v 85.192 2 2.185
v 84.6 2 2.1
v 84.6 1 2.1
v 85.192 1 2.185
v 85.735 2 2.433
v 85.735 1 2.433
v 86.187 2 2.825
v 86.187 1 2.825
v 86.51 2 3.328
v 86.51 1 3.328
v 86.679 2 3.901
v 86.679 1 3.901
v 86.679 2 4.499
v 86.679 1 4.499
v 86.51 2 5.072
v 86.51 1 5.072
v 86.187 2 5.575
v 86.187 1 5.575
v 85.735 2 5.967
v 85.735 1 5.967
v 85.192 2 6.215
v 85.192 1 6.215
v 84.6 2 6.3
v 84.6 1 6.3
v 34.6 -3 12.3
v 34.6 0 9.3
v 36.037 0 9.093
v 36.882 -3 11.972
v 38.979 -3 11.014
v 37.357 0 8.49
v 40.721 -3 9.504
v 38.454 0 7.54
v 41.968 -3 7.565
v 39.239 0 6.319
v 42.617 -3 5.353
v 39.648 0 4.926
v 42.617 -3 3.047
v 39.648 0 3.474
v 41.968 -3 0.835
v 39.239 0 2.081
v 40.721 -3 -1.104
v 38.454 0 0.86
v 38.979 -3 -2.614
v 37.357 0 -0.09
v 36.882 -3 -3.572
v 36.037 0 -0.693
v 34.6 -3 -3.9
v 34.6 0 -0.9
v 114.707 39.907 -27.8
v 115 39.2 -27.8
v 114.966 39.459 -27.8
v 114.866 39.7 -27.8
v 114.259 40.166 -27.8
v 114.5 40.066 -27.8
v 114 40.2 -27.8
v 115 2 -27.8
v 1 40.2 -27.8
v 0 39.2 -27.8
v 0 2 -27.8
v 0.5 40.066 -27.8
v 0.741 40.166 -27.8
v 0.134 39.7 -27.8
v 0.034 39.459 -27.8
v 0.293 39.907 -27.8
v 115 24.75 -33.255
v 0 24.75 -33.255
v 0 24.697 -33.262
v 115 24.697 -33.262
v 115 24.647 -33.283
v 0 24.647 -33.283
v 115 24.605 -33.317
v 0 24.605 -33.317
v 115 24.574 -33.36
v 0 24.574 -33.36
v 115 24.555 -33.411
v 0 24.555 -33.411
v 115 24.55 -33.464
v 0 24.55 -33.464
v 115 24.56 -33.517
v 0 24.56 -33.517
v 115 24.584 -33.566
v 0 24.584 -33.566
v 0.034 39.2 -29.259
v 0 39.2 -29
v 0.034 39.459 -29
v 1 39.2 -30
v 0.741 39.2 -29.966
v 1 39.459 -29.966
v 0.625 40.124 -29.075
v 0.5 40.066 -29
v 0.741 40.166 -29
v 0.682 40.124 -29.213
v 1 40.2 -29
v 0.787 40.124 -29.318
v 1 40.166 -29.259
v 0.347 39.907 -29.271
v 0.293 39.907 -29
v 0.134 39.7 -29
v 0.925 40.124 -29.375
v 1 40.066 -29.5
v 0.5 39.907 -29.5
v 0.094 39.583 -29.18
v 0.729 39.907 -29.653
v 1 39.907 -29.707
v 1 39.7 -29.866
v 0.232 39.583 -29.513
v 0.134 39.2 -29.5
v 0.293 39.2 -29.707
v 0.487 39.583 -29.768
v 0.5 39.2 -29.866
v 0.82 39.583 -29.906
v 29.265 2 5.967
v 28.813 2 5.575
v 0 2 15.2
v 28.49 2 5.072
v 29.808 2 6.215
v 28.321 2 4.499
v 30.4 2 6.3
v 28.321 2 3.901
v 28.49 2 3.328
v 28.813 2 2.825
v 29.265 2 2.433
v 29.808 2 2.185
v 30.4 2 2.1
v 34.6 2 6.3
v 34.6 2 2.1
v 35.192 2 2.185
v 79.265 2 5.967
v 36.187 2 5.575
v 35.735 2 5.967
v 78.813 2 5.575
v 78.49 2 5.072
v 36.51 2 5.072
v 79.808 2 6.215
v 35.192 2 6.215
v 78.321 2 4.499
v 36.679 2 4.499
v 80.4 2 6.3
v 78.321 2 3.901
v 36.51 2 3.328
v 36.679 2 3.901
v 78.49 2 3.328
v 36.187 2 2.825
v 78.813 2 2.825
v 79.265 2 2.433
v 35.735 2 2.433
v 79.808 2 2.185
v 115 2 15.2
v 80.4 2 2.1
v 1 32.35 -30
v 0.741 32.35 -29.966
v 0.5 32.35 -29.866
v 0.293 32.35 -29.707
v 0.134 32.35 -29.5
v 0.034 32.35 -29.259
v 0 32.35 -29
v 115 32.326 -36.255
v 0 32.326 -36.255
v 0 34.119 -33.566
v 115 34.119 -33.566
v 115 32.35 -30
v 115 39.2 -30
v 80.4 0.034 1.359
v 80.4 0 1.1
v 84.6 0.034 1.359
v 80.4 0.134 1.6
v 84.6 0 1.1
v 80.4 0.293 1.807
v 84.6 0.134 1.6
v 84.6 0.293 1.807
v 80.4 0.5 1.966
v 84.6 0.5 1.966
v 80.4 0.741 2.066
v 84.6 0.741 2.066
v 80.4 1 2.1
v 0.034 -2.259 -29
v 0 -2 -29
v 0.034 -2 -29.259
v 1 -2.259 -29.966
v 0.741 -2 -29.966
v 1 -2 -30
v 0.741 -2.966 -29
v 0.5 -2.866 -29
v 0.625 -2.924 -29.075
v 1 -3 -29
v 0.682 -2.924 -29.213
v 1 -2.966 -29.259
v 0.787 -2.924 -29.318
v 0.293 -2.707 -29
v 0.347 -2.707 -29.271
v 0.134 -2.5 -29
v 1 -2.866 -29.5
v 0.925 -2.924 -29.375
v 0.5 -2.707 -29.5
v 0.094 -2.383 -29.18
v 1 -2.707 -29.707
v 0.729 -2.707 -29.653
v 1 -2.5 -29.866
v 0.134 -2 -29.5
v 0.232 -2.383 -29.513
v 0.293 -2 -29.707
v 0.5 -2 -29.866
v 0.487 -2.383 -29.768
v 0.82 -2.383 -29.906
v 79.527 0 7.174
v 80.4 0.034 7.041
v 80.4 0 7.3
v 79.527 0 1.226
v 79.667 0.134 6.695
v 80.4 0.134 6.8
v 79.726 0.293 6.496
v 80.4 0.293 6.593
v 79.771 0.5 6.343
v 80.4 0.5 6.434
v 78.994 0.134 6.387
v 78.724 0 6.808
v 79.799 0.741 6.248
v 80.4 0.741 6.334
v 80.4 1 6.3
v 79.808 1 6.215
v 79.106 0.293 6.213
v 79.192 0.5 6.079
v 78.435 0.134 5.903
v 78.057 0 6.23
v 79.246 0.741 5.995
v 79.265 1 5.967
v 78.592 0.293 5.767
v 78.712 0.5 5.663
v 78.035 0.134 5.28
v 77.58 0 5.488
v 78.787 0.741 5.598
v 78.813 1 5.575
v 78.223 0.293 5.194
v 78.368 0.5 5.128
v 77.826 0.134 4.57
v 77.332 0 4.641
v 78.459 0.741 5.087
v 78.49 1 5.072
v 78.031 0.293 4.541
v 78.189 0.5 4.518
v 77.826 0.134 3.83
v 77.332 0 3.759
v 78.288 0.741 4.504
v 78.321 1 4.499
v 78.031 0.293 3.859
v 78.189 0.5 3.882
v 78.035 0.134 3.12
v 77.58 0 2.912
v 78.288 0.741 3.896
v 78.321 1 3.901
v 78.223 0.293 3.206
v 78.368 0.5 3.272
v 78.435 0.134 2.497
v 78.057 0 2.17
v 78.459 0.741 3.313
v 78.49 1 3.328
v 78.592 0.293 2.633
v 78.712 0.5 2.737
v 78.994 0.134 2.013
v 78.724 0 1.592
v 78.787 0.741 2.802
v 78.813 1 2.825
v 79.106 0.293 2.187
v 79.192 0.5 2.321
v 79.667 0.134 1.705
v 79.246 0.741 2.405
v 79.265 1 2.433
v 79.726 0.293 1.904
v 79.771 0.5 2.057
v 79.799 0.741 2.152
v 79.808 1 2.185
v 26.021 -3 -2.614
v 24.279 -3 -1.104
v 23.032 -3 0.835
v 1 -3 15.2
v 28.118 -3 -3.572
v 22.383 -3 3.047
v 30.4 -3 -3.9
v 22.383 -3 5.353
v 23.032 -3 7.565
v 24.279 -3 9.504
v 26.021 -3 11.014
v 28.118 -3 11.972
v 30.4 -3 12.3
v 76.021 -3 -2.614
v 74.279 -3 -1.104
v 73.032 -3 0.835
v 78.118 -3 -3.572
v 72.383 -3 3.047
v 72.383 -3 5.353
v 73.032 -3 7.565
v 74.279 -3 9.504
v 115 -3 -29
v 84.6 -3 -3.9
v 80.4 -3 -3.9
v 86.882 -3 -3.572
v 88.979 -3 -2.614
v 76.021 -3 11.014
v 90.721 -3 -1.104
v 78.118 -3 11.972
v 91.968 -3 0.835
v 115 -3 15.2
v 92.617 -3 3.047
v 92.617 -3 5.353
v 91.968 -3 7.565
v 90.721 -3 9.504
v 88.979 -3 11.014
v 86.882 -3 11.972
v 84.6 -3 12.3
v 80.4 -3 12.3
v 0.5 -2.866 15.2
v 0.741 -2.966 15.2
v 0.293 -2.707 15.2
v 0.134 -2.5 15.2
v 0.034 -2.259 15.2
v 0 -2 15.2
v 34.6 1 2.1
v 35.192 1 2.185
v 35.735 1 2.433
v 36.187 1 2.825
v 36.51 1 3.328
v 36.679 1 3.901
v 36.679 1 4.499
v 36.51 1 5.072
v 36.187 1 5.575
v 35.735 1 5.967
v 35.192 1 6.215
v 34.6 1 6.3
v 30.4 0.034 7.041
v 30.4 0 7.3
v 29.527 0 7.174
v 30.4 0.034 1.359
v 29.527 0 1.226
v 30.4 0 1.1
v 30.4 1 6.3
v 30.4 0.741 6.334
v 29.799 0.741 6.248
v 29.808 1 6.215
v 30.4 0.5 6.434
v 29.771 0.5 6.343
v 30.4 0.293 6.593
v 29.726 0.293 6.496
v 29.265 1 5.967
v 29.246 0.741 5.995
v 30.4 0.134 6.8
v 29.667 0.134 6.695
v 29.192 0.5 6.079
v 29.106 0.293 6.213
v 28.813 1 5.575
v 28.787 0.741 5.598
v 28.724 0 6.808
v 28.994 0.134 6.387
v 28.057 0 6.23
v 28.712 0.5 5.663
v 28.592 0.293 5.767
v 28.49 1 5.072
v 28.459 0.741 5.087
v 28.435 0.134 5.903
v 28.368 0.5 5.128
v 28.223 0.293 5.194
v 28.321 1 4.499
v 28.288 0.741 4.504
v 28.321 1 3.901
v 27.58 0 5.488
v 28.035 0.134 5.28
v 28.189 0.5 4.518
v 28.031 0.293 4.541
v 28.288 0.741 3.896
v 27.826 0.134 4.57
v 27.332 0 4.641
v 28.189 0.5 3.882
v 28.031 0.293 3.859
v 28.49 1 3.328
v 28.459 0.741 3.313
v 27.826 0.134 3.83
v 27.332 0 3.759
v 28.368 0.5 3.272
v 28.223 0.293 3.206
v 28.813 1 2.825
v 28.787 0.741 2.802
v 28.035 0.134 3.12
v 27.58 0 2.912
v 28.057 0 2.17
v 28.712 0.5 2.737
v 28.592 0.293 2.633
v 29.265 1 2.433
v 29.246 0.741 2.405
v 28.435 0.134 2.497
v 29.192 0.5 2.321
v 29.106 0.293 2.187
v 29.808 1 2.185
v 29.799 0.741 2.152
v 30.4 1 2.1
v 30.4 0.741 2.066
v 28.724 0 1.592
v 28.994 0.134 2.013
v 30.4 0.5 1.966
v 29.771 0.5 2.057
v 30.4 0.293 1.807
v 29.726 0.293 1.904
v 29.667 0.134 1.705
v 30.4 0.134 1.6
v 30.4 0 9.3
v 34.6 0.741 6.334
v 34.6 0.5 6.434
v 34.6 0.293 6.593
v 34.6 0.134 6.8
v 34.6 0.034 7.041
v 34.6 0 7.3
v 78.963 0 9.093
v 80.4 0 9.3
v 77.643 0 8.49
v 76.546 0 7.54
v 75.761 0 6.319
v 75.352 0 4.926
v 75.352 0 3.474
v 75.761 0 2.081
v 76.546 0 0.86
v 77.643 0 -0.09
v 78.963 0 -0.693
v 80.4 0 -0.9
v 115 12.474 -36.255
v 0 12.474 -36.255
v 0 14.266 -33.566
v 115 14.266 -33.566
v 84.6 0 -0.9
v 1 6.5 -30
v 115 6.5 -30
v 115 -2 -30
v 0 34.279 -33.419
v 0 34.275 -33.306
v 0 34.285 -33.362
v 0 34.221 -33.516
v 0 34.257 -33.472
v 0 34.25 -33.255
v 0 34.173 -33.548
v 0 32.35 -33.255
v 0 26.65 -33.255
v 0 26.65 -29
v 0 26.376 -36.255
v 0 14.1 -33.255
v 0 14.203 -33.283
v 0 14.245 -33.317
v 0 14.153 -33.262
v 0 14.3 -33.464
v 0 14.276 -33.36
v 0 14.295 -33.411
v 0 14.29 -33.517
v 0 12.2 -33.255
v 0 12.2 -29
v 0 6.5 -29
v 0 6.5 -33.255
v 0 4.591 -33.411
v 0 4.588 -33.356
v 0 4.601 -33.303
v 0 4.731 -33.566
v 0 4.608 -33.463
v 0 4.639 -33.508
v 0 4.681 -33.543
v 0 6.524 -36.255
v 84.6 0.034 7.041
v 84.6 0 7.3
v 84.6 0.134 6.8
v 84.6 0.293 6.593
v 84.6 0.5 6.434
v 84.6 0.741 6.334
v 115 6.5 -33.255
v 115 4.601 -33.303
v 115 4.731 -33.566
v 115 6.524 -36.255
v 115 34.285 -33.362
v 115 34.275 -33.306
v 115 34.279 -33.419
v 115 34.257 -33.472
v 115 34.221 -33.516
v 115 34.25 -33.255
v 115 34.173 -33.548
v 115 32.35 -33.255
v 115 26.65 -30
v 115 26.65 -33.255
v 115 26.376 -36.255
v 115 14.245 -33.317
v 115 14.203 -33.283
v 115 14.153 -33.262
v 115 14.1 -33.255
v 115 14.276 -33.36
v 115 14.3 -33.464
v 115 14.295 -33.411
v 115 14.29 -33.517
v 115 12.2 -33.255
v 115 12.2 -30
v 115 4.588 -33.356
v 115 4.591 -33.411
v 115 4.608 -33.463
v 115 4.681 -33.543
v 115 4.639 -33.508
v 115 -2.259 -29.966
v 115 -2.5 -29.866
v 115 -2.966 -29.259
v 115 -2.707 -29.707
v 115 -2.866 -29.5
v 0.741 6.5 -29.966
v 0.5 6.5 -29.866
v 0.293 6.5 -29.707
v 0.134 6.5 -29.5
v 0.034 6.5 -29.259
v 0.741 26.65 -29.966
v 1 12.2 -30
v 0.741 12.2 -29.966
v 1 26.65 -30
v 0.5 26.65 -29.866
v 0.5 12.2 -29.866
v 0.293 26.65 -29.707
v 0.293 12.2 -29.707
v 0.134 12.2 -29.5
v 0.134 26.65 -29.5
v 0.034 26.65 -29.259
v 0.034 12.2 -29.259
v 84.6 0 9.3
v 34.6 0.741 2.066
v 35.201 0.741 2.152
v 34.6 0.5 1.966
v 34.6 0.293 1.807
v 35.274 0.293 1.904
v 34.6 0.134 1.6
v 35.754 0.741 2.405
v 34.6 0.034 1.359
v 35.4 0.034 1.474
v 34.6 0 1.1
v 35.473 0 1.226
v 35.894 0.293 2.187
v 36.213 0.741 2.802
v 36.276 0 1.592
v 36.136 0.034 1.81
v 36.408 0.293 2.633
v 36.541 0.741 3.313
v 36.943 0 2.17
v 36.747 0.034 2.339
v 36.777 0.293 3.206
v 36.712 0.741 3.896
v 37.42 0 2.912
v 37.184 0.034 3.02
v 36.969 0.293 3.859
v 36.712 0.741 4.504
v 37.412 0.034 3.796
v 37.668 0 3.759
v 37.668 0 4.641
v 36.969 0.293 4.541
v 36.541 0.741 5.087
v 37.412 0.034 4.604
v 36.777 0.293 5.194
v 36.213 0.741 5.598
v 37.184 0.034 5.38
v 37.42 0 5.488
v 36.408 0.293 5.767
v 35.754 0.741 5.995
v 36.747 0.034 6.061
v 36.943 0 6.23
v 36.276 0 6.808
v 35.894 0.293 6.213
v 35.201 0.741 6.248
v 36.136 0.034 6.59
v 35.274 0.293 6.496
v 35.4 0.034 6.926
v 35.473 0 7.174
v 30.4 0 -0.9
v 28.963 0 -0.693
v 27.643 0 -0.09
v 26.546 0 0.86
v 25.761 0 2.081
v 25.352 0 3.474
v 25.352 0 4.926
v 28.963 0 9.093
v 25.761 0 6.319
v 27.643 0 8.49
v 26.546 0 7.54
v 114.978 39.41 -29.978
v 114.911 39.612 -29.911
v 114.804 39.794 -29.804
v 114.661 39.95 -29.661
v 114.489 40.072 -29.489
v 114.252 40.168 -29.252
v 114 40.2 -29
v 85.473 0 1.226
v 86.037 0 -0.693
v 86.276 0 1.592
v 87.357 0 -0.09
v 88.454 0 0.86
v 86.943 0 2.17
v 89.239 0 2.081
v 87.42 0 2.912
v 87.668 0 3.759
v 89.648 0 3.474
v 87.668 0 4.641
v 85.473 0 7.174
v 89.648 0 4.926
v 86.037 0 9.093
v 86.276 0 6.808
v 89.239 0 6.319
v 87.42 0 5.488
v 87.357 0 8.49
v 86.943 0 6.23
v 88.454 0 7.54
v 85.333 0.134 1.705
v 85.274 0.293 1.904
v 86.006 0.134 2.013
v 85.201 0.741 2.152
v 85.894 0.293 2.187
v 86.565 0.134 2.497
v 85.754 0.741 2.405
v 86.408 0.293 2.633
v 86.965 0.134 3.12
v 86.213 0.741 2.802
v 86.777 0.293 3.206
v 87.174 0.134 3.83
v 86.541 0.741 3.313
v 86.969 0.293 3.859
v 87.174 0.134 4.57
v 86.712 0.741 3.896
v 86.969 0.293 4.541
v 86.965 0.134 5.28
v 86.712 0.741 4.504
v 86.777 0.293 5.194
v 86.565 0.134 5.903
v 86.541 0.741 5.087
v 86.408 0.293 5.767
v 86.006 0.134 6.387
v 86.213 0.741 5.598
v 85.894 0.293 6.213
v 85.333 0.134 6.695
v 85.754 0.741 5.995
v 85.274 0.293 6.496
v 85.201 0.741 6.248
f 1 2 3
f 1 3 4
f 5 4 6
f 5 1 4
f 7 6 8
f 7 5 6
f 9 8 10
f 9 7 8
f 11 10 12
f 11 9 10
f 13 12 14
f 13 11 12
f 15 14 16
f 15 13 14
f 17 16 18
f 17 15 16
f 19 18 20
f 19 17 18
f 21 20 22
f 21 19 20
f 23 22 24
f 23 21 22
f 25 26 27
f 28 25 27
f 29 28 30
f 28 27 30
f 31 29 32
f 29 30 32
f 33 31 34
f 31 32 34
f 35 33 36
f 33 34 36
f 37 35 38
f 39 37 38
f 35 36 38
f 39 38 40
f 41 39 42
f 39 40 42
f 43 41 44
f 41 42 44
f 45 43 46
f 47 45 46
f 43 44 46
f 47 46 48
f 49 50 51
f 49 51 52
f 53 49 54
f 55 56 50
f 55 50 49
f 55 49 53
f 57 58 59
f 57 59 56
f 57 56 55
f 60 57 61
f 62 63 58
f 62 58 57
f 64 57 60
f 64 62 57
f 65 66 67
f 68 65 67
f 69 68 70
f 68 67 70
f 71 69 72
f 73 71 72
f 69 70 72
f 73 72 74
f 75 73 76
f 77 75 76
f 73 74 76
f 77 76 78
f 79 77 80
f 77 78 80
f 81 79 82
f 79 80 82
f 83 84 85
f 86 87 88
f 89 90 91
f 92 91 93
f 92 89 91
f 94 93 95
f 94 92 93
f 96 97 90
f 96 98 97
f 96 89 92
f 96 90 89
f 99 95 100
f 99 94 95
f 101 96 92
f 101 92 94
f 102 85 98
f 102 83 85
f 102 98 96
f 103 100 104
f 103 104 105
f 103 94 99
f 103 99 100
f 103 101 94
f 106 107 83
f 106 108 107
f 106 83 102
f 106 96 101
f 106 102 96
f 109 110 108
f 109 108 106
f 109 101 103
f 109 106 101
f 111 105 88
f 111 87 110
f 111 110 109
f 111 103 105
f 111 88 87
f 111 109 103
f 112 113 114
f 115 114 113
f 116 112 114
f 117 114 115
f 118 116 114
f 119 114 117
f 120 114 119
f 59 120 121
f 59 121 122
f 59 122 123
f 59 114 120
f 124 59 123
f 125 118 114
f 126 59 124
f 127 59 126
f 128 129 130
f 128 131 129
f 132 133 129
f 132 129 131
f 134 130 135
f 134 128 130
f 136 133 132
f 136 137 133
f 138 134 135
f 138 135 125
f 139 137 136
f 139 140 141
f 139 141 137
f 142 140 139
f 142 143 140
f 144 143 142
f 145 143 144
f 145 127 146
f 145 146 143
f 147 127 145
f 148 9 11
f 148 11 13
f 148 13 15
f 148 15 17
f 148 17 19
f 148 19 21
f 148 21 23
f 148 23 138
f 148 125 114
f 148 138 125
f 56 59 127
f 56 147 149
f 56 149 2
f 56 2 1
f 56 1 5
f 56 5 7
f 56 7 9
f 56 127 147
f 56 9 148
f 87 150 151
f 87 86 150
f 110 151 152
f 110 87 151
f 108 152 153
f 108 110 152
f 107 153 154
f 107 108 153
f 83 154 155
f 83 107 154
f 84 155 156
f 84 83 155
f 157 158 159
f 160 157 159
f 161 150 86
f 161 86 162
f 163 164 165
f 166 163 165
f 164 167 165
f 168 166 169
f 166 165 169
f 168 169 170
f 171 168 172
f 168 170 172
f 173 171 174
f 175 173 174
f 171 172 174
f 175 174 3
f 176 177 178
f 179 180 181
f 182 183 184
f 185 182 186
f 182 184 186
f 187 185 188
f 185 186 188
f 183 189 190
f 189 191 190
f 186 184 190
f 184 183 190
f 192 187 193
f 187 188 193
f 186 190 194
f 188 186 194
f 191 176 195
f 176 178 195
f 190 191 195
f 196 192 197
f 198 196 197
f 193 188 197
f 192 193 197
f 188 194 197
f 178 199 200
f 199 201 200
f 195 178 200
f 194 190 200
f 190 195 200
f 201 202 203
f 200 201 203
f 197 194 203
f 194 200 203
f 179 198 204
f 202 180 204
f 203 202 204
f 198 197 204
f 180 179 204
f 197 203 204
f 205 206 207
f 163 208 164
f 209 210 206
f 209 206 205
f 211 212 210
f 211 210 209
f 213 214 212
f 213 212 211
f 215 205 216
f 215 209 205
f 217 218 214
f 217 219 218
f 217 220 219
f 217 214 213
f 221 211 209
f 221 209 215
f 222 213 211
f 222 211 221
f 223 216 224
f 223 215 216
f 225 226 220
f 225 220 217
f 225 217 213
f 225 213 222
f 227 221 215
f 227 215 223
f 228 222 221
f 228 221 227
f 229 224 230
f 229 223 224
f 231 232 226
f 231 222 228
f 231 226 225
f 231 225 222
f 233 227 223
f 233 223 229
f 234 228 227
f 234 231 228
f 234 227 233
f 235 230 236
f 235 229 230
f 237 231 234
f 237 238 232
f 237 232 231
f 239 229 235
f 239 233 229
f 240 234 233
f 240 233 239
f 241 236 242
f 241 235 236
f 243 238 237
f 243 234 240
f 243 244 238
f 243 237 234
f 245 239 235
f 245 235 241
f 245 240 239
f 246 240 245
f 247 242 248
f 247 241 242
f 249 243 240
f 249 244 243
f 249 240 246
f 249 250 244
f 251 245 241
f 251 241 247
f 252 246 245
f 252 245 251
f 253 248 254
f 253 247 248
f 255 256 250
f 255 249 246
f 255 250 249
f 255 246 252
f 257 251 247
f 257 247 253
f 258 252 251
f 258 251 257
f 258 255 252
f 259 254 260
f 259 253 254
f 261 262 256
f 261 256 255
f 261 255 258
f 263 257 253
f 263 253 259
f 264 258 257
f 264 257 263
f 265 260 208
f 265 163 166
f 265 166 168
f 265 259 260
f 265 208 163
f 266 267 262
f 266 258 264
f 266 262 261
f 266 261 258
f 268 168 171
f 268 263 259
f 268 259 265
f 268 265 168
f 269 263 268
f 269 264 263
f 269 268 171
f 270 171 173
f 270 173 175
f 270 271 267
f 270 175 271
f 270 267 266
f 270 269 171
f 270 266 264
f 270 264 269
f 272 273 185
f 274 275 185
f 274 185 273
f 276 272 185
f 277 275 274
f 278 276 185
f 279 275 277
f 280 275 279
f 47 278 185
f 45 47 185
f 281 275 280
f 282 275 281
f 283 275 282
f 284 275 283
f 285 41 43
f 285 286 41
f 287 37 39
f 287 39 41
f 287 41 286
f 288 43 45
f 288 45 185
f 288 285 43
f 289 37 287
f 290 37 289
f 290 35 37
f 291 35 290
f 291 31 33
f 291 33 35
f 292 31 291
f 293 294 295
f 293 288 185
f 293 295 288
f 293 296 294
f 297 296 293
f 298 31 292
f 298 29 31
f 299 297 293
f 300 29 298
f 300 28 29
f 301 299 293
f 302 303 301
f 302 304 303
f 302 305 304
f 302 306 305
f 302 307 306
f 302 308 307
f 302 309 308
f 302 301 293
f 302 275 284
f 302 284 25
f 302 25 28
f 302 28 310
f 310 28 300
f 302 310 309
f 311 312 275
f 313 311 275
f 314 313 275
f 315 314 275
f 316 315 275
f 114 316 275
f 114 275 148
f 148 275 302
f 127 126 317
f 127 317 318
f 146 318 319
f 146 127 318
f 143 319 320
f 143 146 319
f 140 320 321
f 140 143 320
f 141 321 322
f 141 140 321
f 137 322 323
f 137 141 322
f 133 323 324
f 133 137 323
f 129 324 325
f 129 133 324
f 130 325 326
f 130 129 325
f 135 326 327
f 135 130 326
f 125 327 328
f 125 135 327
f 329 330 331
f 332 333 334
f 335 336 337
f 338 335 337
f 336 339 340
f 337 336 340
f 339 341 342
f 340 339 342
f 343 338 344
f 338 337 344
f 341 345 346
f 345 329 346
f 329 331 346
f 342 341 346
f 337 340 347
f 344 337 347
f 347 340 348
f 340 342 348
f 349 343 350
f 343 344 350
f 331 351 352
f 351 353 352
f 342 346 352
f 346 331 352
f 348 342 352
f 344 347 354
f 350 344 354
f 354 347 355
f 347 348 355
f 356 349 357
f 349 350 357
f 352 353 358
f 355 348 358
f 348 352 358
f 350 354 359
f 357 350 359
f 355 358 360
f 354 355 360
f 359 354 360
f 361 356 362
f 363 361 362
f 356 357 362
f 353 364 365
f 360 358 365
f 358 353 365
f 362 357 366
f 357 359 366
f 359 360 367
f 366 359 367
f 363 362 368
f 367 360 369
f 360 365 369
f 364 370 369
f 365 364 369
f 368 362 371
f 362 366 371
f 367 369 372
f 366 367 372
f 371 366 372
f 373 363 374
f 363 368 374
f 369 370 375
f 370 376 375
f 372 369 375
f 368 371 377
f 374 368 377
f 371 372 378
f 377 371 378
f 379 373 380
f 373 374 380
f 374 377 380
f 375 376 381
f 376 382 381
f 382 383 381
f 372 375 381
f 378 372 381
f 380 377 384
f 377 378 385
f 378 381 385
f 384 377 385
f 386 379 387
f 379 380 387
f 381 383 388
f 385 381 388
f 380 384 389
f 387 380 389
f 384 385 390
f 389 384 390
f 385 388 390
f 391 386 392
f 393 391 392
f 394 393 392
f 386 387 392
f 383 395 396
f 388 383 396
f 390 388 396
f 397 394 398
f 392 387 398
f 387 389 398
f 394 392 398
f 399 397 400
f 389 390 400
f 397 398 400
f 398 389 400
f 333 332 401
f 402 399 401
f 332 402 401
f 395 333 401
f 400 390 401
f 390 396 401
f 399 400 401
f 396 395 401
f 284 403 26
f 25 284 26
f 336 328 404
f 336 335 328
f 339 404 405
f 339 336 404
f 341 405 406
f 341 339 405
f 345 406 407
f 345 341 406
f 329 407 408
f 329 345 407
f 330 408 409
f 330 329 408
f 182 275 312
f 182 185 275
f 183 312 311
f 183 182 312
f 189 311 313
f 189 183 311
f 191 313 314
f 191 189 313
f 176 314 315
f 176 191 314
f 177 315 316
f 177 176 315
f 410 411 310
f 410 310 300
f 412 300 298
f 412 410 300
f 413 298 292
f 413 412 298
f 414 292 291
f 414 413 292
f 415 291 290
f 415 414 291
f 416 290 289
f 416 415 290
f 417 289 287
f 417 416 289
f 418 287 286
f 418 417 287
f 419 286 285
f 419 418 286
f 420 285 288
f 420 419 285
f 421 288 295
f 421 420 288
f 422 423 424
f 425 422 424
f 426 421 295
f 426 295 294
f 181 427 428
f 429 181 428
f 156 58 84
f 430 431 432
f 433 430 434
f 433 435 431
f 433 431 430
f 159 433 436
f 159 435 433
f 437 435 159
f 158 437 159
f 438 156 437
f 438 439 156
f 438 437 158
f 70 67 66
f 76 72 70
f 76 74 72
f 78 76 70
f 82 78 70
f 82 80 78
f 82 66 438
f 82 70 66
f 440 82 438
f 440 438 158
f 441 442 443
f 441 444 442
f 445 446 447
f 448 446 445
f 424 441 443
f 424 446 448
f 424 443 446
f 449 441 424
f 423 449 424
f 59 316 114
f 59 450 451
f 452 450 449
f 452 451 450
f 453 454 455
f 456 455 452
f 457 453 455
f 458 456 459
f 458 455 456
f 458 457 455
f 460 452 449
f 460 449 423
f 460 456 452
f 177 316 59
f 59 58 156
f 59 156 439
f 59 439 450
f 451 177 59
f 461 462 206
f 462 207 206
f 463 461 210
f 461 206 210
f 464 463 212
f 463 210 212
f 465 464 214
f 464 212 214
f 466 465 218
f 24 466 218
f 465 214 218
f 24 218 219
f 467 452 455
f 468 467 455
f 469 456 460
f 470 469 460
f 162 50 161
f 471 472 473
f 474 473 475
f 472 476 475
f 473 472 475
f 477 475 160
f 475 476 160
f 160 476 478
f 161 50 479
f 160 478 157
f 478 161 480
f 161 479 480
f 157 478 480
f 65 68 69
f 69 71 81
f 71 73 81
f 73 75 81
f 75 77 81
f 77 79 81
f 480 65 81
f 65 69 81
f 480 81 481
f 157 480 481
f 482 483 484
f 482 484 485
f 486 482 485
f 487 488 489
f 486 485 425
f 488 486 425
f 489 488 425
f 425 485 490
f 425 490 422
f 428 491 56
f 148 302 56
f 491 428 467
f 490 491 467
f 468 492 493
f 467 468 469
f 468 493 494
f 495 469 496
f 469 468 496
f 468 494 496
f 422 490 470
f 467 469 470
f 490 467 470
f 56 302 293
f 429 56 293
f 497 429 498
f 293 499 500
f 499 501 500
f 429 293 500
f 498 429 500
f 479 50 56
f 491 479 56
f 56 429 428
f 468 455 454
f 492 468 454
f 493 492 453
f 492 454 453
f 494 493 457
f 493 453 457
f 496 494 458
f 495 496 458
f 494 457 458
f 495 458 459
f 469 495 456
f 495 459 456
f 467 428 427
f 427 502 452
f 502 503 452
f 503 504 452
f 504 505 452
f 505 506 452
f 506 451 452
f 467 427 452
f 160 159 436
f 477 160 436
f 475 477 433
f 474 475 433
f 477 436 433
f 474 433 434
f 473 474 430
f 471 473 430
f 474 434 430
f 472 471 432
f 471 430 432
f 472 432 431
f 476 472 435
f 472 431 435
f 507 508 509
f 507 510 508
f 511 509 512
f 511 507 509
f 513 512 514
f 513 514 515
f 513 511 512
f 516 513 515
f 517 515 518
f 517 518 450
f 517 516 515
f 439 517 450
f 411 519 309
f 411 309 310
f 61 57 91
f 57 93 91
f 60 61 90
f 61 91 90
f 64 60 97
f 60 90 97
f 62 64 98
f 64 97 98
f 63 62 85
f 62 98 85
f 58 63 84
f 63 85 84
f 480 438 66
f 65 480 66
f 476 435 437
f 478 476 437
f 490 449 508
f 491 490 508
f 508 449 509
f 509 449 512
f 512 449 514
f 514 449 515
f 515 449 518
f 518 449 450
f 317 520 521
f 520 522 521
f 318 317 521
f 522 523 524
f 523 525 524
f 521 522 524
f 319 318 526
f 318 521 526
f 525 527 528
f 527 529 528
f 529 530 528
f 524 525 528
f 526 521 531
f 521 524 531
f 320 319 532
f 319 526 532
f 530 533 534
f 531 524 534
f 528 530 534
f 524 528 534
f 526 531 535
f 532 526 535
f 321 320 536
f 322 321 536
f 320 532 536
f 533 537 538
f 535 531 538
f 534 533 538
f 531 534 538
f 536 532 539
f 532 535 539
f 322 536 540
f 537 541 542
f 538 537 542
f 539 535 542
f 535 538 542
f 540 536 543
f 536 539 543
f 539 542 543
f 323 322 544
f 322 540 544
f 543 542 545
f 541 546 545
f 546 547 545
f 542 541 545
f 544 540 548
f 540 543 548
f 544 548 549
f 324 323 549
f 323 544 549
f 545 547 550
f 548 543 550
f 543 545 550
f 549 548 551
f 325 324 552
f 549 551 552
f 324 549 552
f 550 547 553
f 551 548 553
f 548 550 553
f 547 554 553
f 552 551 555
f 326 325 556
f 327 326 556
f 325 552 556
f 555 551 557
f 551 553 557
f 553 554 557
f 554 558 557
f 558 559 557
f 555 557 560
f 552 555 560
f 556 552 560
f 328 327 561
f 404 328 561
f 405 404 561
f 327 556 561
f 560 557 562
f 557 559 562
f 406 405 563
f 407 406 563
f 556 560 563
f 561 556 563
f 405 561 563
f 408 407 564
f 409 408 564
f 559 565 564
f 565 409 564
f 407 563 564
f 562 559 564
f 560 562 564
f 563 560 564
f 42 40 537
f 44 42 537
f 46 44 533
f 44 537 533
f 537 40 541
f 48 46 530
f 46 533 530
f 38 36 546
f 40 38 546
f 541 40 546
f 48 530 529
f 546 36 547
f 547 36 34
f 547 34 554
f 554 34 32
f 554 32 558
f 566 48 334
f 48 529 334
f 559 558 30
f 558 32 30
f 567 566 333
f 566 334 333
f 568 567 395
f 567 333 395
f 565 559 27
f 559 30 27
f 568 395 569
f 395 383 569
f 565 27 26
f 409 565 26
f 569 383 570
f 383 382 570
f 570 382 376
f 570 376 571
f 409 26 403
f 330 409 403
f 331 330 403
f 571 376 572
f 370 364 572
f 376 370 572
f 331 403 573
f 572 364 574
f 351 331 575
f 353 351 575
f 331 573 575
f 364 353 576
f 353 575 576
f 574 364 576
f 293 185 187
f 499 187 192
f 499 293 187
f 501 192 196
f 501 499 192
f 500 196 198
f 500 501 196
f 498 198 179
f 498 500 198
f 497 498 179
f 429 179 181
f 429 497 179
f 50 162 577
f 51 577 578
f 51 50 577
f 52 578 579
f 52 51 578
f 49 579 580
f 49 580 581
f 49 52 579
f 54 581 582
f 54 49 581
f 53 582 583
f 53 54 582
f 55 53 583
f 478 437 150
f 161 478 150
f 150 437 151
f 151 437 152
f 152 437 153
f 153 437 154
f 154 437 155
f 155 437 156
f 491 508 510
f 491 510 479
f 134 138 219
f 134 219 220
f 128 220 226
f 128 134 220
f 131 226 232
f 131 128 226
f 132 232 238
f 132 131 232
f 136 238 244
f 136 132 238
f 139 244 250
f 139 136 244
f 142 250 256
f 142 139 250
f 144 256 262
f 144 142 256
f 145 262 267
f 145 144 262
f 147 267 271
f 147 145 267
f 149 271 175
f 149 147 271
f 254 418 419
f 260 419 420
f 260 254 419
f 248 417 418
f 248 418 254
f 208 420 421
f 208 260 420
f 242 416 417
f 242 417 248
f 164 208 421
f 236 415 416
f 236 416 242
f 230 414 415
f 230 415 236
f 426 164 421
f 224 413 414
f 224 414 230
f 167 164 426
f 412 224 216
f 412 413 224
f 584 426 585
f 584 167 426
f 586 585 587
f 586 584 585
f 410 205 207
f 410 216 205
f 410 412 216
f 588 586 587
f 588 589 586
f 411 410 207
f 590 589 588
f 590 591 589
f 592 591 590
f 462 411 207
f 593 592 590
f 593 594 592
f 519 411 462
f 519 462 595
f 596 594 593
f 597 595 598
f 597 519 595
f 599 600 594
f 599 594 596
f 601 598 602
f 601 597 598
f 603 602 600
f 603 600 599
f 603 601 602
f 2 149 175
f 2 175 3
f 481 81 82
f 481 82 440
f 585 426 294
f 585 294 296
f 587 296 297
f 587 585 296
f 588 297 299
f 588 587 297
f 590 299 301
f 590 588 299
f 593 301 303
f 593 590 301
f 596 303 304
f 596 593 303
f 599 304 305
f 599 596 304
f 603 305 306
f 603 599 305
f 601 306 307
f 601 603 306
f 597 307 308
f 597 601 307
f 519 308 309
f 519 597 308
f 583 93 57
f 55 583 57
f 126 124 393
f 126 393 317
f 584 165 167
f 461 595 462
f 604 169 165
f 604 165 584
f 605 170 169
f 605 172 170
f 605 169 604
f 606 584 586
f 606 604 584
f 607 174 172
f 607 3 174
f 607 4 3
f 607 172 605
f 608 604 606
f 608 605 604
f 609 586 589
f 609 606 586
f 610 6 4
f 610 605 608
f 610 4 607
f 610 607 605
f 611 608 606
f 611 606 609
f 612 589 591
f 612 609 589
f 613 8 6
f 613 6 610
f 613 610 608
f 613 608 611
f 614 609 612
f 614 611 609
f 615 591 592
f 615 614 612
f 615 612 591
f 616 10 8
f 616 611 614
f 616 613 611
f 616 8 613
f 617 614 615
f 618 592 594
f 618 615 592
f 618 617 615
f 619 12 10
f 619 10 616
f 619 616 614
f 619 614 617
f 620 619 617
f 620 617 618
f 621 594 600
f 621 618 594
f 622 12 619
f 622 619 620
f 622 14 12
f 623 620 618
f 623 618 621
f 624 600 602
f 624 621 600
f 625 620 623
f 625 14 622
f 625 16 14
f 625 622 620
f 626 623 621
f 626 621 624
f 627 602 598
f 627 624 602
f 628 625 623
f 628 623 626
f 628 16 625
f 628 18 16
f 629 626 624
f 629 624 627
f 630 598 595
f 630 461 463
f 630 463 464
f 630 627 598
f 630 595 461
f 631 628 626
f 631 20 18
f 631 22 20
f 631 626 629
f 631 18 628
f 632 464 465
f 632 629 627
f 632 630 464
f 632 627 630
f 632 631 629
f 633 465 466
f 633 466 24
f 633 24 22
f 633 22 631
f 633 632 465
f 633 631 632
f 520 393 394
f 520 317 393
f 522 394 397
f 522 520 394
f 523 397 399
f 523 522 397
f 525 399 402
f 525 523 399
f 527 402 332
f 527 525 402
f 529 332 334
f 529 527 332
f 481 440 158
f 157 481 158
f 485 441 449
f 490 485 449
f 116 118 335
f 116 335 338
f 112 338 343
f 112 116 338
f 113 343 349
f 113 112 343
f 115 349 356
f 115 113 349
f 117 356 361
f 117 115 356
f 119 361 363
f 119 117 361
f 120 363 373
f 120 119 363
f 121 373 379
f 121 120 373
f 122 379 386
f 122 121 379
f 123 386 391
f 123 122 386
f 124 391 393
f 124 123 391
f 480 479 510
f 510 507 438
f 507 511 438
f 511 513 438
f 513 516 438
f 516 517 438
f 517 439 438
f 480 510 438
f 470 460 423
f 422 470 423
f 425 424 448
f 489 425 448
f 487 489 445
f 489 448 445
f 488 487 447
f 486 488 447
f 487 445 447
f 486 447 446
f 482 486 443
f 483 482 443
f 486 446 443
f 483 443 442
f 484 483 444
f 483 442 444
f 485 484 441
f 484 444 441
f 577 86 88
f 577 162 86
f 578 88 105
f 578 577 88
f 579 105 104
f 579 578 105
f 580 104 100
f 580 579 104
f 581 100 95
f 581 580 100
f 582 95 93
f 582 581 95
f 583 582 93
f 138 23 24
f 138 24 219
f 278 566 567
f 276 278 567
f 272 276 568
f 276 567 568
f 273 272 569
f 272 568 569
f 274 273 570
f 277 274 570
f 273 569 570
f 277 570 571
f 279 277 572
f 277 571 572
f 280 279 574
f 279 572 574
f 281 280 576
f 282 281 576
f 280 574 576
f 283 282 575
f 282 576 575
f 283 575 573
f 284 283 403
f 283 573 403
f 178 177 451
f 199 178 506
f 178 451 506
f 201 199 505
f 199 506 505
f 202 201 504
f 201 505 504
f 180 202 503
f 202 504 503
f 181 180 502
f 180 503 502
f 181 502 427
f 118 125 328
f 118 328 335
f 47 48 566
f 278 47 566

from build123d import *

# Parameters (mm, degrees)
SKETCH_1_W               = 115
SKETCH_1_H               = 30
EXTRUDE_1_DEPTH          = 29
SHELL_1_T                = -2
SKETCH_4_W               = 55
SKETCH_4_H               = 63
EXTRUDE_2_DEPTH          = 2
SKETCH_7_W               = 28
SKETCH_7_H               = 49
CUT_EXTRUDE_2_DEPTH      = 28
EXTRUDE_6_DEPTH          = 29
EXTRUDE_8_DEPTH          = 2
EXTRUDE_9_DEPTH          = 115
FILLET_1_R               = 1
SKETCH_8_R               = 1.2
CUT_EXTRUDE_5_DEPTH      = 10
SKETCH_15_W              = 113
SKETCH_15_H              = 39.979543783
CUT_EXTRUDE_6_DEPTH      = 33
CUT_EXTRUDE_7_REACH      = 152.193
SKETCH_16_W              = 16.4
SKETCH_16_H              = 9.3
SKETCH_17_W              = 40.5
SKETCH_17_H              = 2
EXTRUDE_10_DEPTH         = 113
CUT_EXTRUDE_8_DEPTH      = 147
CUT_EXTRUDE_9_DEPTH      = 147
CUT_EXTRUDE_9_DEPTH_BACK = 147
SKETCH_21_W              = 20.17617045
SKETCH_21_H              = 57.30071962
SKETCH_22_W              = 2
SKETCH_22_H              = 5
CUT_EXTRUDE_11_DEPTH     = 0.2
SKETCH_24_W              = 113
SKETCH_24_H              = 56
EXTRUDE_16_DEPTH         = 0.2
CUT_EXTRUDE_12_DEPTH     = 147
CUT_EXTRUDE_13_DEPTH     = 5
FILLET_8_R               = 1
EXTRUDE_17_DEPTH         = 3
EXTRUDE_17_DEPTH_BACK    = 1
FILLET_10_R              = 1
SKETCH_28_W              = 115
SKETCH_28_H              = 5
EXTRUDE_18_DEPTH         = 1
CUT_EXTRUDE_START        = -3
CUT_EXTRUDE_14_DEPTH     = 3
CHAMFER_7_SIZE           = 3
FILLET_11_R              = 1


with BuildPart() as part:
    # Эскиз1 → Бобышка-Вытянуть1 (new body)
    with BuildSketch(Plane(origin=(0, 0, 0), x_dir=(1, 0, 0), z_dir=(0, 1, 0))):
        with Locations((57.5, 15)):
            Rectangle(SKETCH_1_W, SKETCH_1_H)
    extrude(amount=EXTRUDE_1_DEPTH)

    # Оболочка1
    shell_1_openings = [part.faces().sort_by_distance(p)[0] for p in [
        (57.5, 14.5, 0),
    ]]
    offset(amount=SHELL_1_T, openings=shell_1_openings, kind=Kind.INTERSECTION)

    # Эскиз4 → Бобышка-Вытянуть2 (add)
    with BuildSketch(Plane(origin=(115, 0, 0), x_dir=(0, 0, -1), z_dir=(1, 0, 0))):
        with Locations((15, 31.5)):
            Rectangle(SKETCH_4_W, SKETCH_4_H)
    extrude(amount=EXTRUDE_2_DEPTH)

    # Эскиз7 → Вырез-Вытянуть2 (cut)
    with BuildSketch(Plane(origin=(117, 0, 0), x_dir=(0, 0, -1), z_dir=(1, 0, 0))):
        with Locations((14, 31.5)):
            Rectangle(SKETCH_7_W, SKETCH_7_H)
    extrude(amount=-CUT_EXTRUDE_2_DEPTH, mode=Mode.SUBTRACT)

    # Эскиз10 → Бобышка-Вытянуть6 (add)
    with BuildSketch(Plane(origin=(0, 29, 0), x_dir=(1, 0, 0), z_dir=(0, 1, 0))):
        Polygon((115, 30), (115, 28), (89, 28), (2, 28), (2, 0), (0, 0), (0, 28), (0, 30), (87, 30), align=None)
    extrude(amount=EXTRUDE_6_DEPTH)

    # Эскиз13 → Бобышка-Вытянуть8 (add)
    with BuildSketch(Plane.XZ):
        Polygon((115, 12.5), (115, 40), (0, 40), (0, 0), (115, 0), align=None)
        with BuildLine():
            ThreePointArc((34.6, 31.75), (36.7, 33.85), (34.6, 35.95))
            Line((34.6, 35.95), (30.4, 35.95))
            ThreePointArc((30.4, 35.95), (28.3, 33.85), (30.4, 31.75))
            Line((30.4, 31.75), (34.6, 31.75))
        make_face(mode=Mode.SUBTRACT)
        with BuildLine():
            ThreePointArc((80.4, 35.95), (78.3, 33.85), (80.4, 31.75))
            Line((80.4, 31.75), (84.6, 31.75))
            ThreePointArc((84.6, 31.75), (86.7, 33.85), (84.6, 35.95))
            Line((84.6, 35.95), (80.4, 35.95))
        make_face(mode=Mode.SUBTRACT)
    extrude(amount=-EXTRUDE_8_DEPTH)

    # Эскиз14 → Бобышка-Вытянуть9 (add)
    with BuildSketch(Plane.ZY):
        with BuildLine():
            Line((-33.254799468, 26.65), (-33.254799468, 24.75))
            ThreePointArc((-33.254799468, 24.75), (-33.360427883, 24.57366508), (-33.565739508, 24.583589941))
            Line((-33.565739508, 24.583589941), (-36.254799468, 26.376296582))
            Line((-36.254799468, 26.376296582), (-36.254799468, 32.326296582))
            Line((-36.254799468, 32.326296582), (-33.565739508, 34.119003222))
            ThreePointArc((-33.565739508, 34.119003222), (-33.446213245, 34.269819382), (-33.254799468, 34.25))
            Line((-33.254799468, 34.25), (-33.254799468, 32.35))
            Line((-33.254799468, 32.35), (-30, 32.35))
            Line((-30, 32.35), (-30, 26.65))
            Line((-30, 26.65), (-33.254799468, 26.65))
        make_face()
        with BuildLine():
            Line((-33.254741117, 6.5), (-33.302994959, 4.600612844))
            ThreePointArc((-33.302994959, 4.600612844), (-33.462823881, 4.6084601), (-33.565739508, 4.730996778))
            Line((-33.565739508, 4.730996778), (-36.254799468, 6.523703418))
            Line((-36.254799468, 6.523703418), (-36.254799468, 12.473703418))
            Line((-36.254799468, 12.473703418), (-33.565739508, 14.266410059))
            ThreePointArc((-33.565739508, 14.266410059), (-33.360427883, 14.27633492), (-33.254799468, 14.1))
            Line((-33.254799468, 14.1), (-33.254799468, 12.2))
            Line((-33.254799468, 12.2), (-30, 12.2))
            Line((-30, 12.2), (-30, 6.5))
            Line((-30, 6.5), (-33.254741117, 6.5))
        make_face()
    extrude(amount=-EXTRUDE_9_DEPTH)

    # Скругление1
    fillet_1_edges = [part.edges().sort_by_distance(p)[0] for p in [
        (32.5, 0, 35.95),
        (82.5, 0, 35.95),
        (82.5, 0, 31.75),
        (78.3, 0, 33.85),
        (86.7, 0, 33.85),
        (36.7, 0, 33.85),
        (28.3, 0, 33.85),
        (32.5, 0, 31.75),
    ]]
    fillet(fillet_1_edges, radius=FILLET_1_R)

    # Эскиз8 → Вырез-Вытянуть5 (cut)
    with BuildSketch(Plane(origin=(117, 0, 0), x_dir=(0, 0, -1), z_dir=(1, 0, 0))):
        with Locations((-5.5, 31.5)):
            Circle(SKETCH_8_R)
    extrude(amount=-CUT_EXTRUDE_5_DEPTH, mode=Mode.SUBTRACT)

    # Эскиз15 → Вырез-Вытянуть6 (cut)
    with BuildSketch(Plane.XY.offset(-28)):
        with Locations((58.5, 46.989771892)):
            Rectangle(SKETCH_15_W, SKETCH_15_H)
    extrude(amount=CUT_EXTRUDE_6_DEPTH, mode=Mode.SUBTRACT)

    # Эскиз16 → Вырез-Вытянуть7 (cut, up to next)
    with BuildSketch(Plane(origin=(0, 0, -30), x_dir=(-1, 0, 0), z_dir=(0, 0, -1)), mode=Mode.PRIVATE) as cut_extrude_7_sk1:
        with Locations((-53.2, 49.65)):
            Rectangle(SKETCH_16_W, SKETCH_16_H)
    cut_extrude_7_tool1 = extrude(cut_extrude_7_sk1.sketch, amount=-CUT_EXTRUDE_7_REACH, mode=Mode.PRIVATE) & part.part
    add(cut_extrude_7_tool1.solids().sort_by_distance((53.2, 49.65, -30))[0], mode=Mode.SUBTRACT)

    # Эскиз17 → Бобышка-Вытянуть10 (add)
    with BuildSketch(Plane.ZY.offset(-115)):
        with Locations((-7.75, 57)):
            Rectangle(SKETCH_17_W, SKETCH_17_H)
    extrude(amount=EXTRUDE_10_DEPTH)

    # Эскиз20 → Вырез-Вытянуть8 (cut)
    with BuildSketch(Plane.ZY):
        Polygon((0, 2), (-27.8, 2), (-27.8, 71.965307459), (29.159484087, 71.965307459), (29.159484087, 2), align=None)
    extrude(amount=-CUT_EXTRUDE_8_DEPTH, mode=Mode.SUBTRACT)

    # Эскиз21 → Вырез-Вытянуть9 (cut, two sides: drawn at the far end of the back side and taken through both)
    with BuildSketch(Plane(origin=(0, 2, 0), x_dir=(1, 0, 0), z_dir=(0, 1, 0)).offset(-CUT_EXTRUDE_9_DEPTH_BACK)):
        with Locations((125.088085225, 16.15035981)):
            Rectangle(SKETCH_21_W, SKETCH_21_H)
    extrude(amount=CUT_EXTRUDE_9_DEPTH + CUT_EXTRUDE_9_DEPTH_BACK, mode=Mode.SUBTRACT)

    # Эскиз22 → Вырез-Вытянуть11 (cut)
    with BuildSketch(Plane.XY.offset(-28)):
        with Locations((114, 4.5)):
            Rectangle(SKETCH_22_W, SKETCH_22_H)
    extrude(amount=CUT_EXTRUDE_11_DEPTH, mode=Mode.SUBTRACT)

    # Эскиз24 → Бобышка-Вытянуть16 (add)
    with BuildSketch(Plane.XY.offset(-27.8)):
        with Locations((58.5, 28)):
            Rectangle(SKETCH_24_W, SKETCH_24_H)
    extrude(amount=-EXTRUDE_16_DEPTH)

    # Эскиз25 → Вырез-Вытянуть12 (cut)
    with BuildSketch(Plane(origin=(115, 0, 0), x_dir=(0, 0, -1), z_dir=(1, 0, 0))):
        Polygon((-61.35646419, 61.721146041), (45.258808631, 61.721146041), (45.258808631, 40.2), (-10.2, 40.2), (-10.2, -7.989940419), (-61.35646419, -7.989940419), (-61.35646419, 40.2), align=None)
    extrude(amount=-CUT_EXTRUDE_12_DEPTH, mode=Mode.SUBTRACT)

    # Эскиз26 → Вырез-Вытянуть13 (cut)
    with BuildSketch(Plane(origin=(0, 2, 0), x_dir=(1, 0, 0), z_dir=(0, 1, 0))):
        with BuildLine():
            Line((30.4, -2.1), (34.6, -2.1))
            ThreePointArc((34.6, -2.1), (36.7, -4.2), (34.6, -6.3))
            Line((34.6, -6.3), (30.4, -6.3))
            ThreePointArc((30.4, -6.3), (28.3, -4.2), (30.4, -2.1))
        make_face()
        with BuildLine():
            Line((80.4, -2.1), (84.6, -2.1))
            ThreePointArc((84.6, -2.1), (86.7, -4.2), (84.6, -6.3))
            Line((84.6, -6.3), (80.4, -6.3))
            ThreePointArc((80.4, -6.3), (78.3, -4.2), (80.4, -2.1))
        make_face()
    extrude(amount=-CUT_EXTRUDE_13_DEPTH, mode=Mode.SUBTRACT)

    # Скругление8
    fillet_8_edges = [part.edges().sort_by_distance(p)[0] for p in [
        (0, 3.25, -30),
        (0, 19.425, -30),
        (0, 36.275, -30),
        (0, 40.2, -28.9),
        (57.5, 40.2, -30),
        (115, 40.2, -28.9),
        (57.5, 0, 10.2),
        (57.5, 0, -30),
        (0, 0, -9.9),
    ]]
    fillet(fillet_8_edges, radius=FILLET_8_R)

    # Эскиз27 → Бобышка-Вытянуть17 (add, two sides: drawn at the far end of the back side and taken through both)
    with BuildSketch(Plane.XZ.offset(-EXTRUDE_17_DEPTH_BACK)):
        with BuildLine():
            Line((115, -30), (115, -29))
            Line((115, -29), (115, 9.2))
            Line((115, 9.2), (115, 10.2))
            Line((115, 10.2), (115, 15.2))
            Line((115, 15.2), (0, 15.2))
            Line((0, 15.2), (0, 10.2))
            Line((0, 10.2), (0, -29))
            ThreePointArc((0, -29), (0.292893219, -29.707106781), (1, -30))
            Line((1, -30), (115, -30))
        make_face()
        with BuildLine():
            Line((84.6, 6.3), (80.4, 6.3))
            ThreePointArc((80.4, 6.3), (78.3, 4.2), (80.4, 2.1))
            Line((80.4, 2.1), (84.6, 2.1))
            ThreePointArc((84.6, 2.1), (86.7, 4.2), (84.6, 6.3))
        make_face(mode=Mode.SUBTRACT)
        with BuildLine():
            Line((30.4, 2.1), (34.6, 2.1))
            ThreePointArc((34.6, 2.1), (36.7, 4.2), (34.6, 6.3))
            Line((34.6, 6.3), (30.4, 6.3))
            ThreePointArc((30.4, 6.3), (28.3, 4.2), (30.4, 2.1))
        make_face(mode=Mode.SUBTRACT)
    extrude(amount=EXTRUDE_17_DEPTH + EXTRUDE_17_DEPTH_BACK)

    # Скругление10
    fillet_10_edges = [part.edges().sort_by_distance(p)[0] for p in [
        (58, -3, -30),
        (0, -3, -6.9),
        (0.292893219, -3, -29.707106781),
    ]]
    fillet(fillet_10_edges, radius=FILLET_10_R)

    # Эскиз28 → Бобышка-Вытянуть18 (add)
    with BuildSketch(Plane(origin=(0, 1, 0), x_dir=(1, 0, 0), z_dir=(0, 1, 0))):
        with Locations((57.5, -12.7)):
            Rectangle(SKETCH_28_W, SKETCH_28_H)
    extrude(amount=EXTRUDE_18_DEPTH)

    # Эскиз29 → Вырез-Вытянуть14 (cut)
    # profile 1 of 2: a face of its own
    with BuildSketch(Plane.XZ.offset(3).offset(CUT_EXTRUDE_START)):
        with BuildLine():
            Line((30.4, 9.3), (34.6, 9.3))
            ThreePointArc((34.6, 9.3), (39.7, 4.2), (34.6, -0.9))
            Line((34.6, -0.9), (30.4, -0.9))
            ThreePointArc((30.4, -0.9), (25.3, 4.2), (30.4, 9.3))
        make_face()
        with BuildLine():
            Line((30.4, 2.1), (34.6, 2.1))
            ThreePointArc((34.6, 2.1), (36.7, 4.2), (34.6, 6.3))
            Line((34.6, 6.3), (30.4, 6.3))
            ThreePointArc((30.4, 6.3), (28.3, 4.2), (30.4, 2.1))
        make_face(mode=Mode.SUBTRACT)
    # profile 2 of 2: a face of its own
    with BuildSketch(Plane.XZ.offset(3).offset(CUT_EXTRUDE_START)):
        with BuildLine():
            Line((80.4, -0.9), (84.6, -0.9))
            ThreePointArc((84.6, -0.9), (89.7, 4.2), (84.6, 9.3))
            Line((84.6, 9.3), (80.4, 9.3))
            ThreePointArc((80.4, 9.3), (75.3, 4.2), (80.4, -0.9))
        make_face()
        with BuildLine():
            Line((80.4, 2.1), (84.6, 2.1))
            ThreePointArc((84.6, 2.1), (86.7, 4.2), (84.6, 6.3))
            Line((84.6, 6.3), (80.4, 6.3))
            ThreePointArc((80.4, 6.3), (78.3, 4.2), (80.4, 2.1))
        make_face(mode=Mode.SUBTRACT)
    extrude(amount=CUT_EXTRUDE_14_DEPTH, mode=Mode.SUBTRACT)

    # Фаска7
    chamfer_7_edges = [part.edges().sort_by_distance(p)[0] for p in [
        (82.5, -3, -0.9),
        (89.7, -3, 4.2),
        (75.3, -3, 4.2),
        (82.5, -3, 9.3),
        (32.5, -3, -0.9),
        (39.7, -3, 4.2),
        (25.3, -3, 4.2),
        (32.5, -3, 9.3),
    ]]
    chamfer(chamfer_7_edges, length=CHAMFER_7_SIZE - 0.0001)  # a hair under: the kernel refuses the full size

    # Скругление11
    fillet_11_edges = [part.edges().sort_by_distance(p)[0] for p in [
        (32.5, 0, 6.3),
        (28.3, 0, 4.2),
        (32.5, 0, 2.1),
        (36.7, 0, 4.2),
        (82.5, 0, 6.3),
        (78.3, 0, 4.2),
        (82.5, 0, 2.1),
        (86.7, 0, 4.2),
    ]]
    fillet(fillet_11_edges, radius=FILLET_11_R)


solid = part.part
